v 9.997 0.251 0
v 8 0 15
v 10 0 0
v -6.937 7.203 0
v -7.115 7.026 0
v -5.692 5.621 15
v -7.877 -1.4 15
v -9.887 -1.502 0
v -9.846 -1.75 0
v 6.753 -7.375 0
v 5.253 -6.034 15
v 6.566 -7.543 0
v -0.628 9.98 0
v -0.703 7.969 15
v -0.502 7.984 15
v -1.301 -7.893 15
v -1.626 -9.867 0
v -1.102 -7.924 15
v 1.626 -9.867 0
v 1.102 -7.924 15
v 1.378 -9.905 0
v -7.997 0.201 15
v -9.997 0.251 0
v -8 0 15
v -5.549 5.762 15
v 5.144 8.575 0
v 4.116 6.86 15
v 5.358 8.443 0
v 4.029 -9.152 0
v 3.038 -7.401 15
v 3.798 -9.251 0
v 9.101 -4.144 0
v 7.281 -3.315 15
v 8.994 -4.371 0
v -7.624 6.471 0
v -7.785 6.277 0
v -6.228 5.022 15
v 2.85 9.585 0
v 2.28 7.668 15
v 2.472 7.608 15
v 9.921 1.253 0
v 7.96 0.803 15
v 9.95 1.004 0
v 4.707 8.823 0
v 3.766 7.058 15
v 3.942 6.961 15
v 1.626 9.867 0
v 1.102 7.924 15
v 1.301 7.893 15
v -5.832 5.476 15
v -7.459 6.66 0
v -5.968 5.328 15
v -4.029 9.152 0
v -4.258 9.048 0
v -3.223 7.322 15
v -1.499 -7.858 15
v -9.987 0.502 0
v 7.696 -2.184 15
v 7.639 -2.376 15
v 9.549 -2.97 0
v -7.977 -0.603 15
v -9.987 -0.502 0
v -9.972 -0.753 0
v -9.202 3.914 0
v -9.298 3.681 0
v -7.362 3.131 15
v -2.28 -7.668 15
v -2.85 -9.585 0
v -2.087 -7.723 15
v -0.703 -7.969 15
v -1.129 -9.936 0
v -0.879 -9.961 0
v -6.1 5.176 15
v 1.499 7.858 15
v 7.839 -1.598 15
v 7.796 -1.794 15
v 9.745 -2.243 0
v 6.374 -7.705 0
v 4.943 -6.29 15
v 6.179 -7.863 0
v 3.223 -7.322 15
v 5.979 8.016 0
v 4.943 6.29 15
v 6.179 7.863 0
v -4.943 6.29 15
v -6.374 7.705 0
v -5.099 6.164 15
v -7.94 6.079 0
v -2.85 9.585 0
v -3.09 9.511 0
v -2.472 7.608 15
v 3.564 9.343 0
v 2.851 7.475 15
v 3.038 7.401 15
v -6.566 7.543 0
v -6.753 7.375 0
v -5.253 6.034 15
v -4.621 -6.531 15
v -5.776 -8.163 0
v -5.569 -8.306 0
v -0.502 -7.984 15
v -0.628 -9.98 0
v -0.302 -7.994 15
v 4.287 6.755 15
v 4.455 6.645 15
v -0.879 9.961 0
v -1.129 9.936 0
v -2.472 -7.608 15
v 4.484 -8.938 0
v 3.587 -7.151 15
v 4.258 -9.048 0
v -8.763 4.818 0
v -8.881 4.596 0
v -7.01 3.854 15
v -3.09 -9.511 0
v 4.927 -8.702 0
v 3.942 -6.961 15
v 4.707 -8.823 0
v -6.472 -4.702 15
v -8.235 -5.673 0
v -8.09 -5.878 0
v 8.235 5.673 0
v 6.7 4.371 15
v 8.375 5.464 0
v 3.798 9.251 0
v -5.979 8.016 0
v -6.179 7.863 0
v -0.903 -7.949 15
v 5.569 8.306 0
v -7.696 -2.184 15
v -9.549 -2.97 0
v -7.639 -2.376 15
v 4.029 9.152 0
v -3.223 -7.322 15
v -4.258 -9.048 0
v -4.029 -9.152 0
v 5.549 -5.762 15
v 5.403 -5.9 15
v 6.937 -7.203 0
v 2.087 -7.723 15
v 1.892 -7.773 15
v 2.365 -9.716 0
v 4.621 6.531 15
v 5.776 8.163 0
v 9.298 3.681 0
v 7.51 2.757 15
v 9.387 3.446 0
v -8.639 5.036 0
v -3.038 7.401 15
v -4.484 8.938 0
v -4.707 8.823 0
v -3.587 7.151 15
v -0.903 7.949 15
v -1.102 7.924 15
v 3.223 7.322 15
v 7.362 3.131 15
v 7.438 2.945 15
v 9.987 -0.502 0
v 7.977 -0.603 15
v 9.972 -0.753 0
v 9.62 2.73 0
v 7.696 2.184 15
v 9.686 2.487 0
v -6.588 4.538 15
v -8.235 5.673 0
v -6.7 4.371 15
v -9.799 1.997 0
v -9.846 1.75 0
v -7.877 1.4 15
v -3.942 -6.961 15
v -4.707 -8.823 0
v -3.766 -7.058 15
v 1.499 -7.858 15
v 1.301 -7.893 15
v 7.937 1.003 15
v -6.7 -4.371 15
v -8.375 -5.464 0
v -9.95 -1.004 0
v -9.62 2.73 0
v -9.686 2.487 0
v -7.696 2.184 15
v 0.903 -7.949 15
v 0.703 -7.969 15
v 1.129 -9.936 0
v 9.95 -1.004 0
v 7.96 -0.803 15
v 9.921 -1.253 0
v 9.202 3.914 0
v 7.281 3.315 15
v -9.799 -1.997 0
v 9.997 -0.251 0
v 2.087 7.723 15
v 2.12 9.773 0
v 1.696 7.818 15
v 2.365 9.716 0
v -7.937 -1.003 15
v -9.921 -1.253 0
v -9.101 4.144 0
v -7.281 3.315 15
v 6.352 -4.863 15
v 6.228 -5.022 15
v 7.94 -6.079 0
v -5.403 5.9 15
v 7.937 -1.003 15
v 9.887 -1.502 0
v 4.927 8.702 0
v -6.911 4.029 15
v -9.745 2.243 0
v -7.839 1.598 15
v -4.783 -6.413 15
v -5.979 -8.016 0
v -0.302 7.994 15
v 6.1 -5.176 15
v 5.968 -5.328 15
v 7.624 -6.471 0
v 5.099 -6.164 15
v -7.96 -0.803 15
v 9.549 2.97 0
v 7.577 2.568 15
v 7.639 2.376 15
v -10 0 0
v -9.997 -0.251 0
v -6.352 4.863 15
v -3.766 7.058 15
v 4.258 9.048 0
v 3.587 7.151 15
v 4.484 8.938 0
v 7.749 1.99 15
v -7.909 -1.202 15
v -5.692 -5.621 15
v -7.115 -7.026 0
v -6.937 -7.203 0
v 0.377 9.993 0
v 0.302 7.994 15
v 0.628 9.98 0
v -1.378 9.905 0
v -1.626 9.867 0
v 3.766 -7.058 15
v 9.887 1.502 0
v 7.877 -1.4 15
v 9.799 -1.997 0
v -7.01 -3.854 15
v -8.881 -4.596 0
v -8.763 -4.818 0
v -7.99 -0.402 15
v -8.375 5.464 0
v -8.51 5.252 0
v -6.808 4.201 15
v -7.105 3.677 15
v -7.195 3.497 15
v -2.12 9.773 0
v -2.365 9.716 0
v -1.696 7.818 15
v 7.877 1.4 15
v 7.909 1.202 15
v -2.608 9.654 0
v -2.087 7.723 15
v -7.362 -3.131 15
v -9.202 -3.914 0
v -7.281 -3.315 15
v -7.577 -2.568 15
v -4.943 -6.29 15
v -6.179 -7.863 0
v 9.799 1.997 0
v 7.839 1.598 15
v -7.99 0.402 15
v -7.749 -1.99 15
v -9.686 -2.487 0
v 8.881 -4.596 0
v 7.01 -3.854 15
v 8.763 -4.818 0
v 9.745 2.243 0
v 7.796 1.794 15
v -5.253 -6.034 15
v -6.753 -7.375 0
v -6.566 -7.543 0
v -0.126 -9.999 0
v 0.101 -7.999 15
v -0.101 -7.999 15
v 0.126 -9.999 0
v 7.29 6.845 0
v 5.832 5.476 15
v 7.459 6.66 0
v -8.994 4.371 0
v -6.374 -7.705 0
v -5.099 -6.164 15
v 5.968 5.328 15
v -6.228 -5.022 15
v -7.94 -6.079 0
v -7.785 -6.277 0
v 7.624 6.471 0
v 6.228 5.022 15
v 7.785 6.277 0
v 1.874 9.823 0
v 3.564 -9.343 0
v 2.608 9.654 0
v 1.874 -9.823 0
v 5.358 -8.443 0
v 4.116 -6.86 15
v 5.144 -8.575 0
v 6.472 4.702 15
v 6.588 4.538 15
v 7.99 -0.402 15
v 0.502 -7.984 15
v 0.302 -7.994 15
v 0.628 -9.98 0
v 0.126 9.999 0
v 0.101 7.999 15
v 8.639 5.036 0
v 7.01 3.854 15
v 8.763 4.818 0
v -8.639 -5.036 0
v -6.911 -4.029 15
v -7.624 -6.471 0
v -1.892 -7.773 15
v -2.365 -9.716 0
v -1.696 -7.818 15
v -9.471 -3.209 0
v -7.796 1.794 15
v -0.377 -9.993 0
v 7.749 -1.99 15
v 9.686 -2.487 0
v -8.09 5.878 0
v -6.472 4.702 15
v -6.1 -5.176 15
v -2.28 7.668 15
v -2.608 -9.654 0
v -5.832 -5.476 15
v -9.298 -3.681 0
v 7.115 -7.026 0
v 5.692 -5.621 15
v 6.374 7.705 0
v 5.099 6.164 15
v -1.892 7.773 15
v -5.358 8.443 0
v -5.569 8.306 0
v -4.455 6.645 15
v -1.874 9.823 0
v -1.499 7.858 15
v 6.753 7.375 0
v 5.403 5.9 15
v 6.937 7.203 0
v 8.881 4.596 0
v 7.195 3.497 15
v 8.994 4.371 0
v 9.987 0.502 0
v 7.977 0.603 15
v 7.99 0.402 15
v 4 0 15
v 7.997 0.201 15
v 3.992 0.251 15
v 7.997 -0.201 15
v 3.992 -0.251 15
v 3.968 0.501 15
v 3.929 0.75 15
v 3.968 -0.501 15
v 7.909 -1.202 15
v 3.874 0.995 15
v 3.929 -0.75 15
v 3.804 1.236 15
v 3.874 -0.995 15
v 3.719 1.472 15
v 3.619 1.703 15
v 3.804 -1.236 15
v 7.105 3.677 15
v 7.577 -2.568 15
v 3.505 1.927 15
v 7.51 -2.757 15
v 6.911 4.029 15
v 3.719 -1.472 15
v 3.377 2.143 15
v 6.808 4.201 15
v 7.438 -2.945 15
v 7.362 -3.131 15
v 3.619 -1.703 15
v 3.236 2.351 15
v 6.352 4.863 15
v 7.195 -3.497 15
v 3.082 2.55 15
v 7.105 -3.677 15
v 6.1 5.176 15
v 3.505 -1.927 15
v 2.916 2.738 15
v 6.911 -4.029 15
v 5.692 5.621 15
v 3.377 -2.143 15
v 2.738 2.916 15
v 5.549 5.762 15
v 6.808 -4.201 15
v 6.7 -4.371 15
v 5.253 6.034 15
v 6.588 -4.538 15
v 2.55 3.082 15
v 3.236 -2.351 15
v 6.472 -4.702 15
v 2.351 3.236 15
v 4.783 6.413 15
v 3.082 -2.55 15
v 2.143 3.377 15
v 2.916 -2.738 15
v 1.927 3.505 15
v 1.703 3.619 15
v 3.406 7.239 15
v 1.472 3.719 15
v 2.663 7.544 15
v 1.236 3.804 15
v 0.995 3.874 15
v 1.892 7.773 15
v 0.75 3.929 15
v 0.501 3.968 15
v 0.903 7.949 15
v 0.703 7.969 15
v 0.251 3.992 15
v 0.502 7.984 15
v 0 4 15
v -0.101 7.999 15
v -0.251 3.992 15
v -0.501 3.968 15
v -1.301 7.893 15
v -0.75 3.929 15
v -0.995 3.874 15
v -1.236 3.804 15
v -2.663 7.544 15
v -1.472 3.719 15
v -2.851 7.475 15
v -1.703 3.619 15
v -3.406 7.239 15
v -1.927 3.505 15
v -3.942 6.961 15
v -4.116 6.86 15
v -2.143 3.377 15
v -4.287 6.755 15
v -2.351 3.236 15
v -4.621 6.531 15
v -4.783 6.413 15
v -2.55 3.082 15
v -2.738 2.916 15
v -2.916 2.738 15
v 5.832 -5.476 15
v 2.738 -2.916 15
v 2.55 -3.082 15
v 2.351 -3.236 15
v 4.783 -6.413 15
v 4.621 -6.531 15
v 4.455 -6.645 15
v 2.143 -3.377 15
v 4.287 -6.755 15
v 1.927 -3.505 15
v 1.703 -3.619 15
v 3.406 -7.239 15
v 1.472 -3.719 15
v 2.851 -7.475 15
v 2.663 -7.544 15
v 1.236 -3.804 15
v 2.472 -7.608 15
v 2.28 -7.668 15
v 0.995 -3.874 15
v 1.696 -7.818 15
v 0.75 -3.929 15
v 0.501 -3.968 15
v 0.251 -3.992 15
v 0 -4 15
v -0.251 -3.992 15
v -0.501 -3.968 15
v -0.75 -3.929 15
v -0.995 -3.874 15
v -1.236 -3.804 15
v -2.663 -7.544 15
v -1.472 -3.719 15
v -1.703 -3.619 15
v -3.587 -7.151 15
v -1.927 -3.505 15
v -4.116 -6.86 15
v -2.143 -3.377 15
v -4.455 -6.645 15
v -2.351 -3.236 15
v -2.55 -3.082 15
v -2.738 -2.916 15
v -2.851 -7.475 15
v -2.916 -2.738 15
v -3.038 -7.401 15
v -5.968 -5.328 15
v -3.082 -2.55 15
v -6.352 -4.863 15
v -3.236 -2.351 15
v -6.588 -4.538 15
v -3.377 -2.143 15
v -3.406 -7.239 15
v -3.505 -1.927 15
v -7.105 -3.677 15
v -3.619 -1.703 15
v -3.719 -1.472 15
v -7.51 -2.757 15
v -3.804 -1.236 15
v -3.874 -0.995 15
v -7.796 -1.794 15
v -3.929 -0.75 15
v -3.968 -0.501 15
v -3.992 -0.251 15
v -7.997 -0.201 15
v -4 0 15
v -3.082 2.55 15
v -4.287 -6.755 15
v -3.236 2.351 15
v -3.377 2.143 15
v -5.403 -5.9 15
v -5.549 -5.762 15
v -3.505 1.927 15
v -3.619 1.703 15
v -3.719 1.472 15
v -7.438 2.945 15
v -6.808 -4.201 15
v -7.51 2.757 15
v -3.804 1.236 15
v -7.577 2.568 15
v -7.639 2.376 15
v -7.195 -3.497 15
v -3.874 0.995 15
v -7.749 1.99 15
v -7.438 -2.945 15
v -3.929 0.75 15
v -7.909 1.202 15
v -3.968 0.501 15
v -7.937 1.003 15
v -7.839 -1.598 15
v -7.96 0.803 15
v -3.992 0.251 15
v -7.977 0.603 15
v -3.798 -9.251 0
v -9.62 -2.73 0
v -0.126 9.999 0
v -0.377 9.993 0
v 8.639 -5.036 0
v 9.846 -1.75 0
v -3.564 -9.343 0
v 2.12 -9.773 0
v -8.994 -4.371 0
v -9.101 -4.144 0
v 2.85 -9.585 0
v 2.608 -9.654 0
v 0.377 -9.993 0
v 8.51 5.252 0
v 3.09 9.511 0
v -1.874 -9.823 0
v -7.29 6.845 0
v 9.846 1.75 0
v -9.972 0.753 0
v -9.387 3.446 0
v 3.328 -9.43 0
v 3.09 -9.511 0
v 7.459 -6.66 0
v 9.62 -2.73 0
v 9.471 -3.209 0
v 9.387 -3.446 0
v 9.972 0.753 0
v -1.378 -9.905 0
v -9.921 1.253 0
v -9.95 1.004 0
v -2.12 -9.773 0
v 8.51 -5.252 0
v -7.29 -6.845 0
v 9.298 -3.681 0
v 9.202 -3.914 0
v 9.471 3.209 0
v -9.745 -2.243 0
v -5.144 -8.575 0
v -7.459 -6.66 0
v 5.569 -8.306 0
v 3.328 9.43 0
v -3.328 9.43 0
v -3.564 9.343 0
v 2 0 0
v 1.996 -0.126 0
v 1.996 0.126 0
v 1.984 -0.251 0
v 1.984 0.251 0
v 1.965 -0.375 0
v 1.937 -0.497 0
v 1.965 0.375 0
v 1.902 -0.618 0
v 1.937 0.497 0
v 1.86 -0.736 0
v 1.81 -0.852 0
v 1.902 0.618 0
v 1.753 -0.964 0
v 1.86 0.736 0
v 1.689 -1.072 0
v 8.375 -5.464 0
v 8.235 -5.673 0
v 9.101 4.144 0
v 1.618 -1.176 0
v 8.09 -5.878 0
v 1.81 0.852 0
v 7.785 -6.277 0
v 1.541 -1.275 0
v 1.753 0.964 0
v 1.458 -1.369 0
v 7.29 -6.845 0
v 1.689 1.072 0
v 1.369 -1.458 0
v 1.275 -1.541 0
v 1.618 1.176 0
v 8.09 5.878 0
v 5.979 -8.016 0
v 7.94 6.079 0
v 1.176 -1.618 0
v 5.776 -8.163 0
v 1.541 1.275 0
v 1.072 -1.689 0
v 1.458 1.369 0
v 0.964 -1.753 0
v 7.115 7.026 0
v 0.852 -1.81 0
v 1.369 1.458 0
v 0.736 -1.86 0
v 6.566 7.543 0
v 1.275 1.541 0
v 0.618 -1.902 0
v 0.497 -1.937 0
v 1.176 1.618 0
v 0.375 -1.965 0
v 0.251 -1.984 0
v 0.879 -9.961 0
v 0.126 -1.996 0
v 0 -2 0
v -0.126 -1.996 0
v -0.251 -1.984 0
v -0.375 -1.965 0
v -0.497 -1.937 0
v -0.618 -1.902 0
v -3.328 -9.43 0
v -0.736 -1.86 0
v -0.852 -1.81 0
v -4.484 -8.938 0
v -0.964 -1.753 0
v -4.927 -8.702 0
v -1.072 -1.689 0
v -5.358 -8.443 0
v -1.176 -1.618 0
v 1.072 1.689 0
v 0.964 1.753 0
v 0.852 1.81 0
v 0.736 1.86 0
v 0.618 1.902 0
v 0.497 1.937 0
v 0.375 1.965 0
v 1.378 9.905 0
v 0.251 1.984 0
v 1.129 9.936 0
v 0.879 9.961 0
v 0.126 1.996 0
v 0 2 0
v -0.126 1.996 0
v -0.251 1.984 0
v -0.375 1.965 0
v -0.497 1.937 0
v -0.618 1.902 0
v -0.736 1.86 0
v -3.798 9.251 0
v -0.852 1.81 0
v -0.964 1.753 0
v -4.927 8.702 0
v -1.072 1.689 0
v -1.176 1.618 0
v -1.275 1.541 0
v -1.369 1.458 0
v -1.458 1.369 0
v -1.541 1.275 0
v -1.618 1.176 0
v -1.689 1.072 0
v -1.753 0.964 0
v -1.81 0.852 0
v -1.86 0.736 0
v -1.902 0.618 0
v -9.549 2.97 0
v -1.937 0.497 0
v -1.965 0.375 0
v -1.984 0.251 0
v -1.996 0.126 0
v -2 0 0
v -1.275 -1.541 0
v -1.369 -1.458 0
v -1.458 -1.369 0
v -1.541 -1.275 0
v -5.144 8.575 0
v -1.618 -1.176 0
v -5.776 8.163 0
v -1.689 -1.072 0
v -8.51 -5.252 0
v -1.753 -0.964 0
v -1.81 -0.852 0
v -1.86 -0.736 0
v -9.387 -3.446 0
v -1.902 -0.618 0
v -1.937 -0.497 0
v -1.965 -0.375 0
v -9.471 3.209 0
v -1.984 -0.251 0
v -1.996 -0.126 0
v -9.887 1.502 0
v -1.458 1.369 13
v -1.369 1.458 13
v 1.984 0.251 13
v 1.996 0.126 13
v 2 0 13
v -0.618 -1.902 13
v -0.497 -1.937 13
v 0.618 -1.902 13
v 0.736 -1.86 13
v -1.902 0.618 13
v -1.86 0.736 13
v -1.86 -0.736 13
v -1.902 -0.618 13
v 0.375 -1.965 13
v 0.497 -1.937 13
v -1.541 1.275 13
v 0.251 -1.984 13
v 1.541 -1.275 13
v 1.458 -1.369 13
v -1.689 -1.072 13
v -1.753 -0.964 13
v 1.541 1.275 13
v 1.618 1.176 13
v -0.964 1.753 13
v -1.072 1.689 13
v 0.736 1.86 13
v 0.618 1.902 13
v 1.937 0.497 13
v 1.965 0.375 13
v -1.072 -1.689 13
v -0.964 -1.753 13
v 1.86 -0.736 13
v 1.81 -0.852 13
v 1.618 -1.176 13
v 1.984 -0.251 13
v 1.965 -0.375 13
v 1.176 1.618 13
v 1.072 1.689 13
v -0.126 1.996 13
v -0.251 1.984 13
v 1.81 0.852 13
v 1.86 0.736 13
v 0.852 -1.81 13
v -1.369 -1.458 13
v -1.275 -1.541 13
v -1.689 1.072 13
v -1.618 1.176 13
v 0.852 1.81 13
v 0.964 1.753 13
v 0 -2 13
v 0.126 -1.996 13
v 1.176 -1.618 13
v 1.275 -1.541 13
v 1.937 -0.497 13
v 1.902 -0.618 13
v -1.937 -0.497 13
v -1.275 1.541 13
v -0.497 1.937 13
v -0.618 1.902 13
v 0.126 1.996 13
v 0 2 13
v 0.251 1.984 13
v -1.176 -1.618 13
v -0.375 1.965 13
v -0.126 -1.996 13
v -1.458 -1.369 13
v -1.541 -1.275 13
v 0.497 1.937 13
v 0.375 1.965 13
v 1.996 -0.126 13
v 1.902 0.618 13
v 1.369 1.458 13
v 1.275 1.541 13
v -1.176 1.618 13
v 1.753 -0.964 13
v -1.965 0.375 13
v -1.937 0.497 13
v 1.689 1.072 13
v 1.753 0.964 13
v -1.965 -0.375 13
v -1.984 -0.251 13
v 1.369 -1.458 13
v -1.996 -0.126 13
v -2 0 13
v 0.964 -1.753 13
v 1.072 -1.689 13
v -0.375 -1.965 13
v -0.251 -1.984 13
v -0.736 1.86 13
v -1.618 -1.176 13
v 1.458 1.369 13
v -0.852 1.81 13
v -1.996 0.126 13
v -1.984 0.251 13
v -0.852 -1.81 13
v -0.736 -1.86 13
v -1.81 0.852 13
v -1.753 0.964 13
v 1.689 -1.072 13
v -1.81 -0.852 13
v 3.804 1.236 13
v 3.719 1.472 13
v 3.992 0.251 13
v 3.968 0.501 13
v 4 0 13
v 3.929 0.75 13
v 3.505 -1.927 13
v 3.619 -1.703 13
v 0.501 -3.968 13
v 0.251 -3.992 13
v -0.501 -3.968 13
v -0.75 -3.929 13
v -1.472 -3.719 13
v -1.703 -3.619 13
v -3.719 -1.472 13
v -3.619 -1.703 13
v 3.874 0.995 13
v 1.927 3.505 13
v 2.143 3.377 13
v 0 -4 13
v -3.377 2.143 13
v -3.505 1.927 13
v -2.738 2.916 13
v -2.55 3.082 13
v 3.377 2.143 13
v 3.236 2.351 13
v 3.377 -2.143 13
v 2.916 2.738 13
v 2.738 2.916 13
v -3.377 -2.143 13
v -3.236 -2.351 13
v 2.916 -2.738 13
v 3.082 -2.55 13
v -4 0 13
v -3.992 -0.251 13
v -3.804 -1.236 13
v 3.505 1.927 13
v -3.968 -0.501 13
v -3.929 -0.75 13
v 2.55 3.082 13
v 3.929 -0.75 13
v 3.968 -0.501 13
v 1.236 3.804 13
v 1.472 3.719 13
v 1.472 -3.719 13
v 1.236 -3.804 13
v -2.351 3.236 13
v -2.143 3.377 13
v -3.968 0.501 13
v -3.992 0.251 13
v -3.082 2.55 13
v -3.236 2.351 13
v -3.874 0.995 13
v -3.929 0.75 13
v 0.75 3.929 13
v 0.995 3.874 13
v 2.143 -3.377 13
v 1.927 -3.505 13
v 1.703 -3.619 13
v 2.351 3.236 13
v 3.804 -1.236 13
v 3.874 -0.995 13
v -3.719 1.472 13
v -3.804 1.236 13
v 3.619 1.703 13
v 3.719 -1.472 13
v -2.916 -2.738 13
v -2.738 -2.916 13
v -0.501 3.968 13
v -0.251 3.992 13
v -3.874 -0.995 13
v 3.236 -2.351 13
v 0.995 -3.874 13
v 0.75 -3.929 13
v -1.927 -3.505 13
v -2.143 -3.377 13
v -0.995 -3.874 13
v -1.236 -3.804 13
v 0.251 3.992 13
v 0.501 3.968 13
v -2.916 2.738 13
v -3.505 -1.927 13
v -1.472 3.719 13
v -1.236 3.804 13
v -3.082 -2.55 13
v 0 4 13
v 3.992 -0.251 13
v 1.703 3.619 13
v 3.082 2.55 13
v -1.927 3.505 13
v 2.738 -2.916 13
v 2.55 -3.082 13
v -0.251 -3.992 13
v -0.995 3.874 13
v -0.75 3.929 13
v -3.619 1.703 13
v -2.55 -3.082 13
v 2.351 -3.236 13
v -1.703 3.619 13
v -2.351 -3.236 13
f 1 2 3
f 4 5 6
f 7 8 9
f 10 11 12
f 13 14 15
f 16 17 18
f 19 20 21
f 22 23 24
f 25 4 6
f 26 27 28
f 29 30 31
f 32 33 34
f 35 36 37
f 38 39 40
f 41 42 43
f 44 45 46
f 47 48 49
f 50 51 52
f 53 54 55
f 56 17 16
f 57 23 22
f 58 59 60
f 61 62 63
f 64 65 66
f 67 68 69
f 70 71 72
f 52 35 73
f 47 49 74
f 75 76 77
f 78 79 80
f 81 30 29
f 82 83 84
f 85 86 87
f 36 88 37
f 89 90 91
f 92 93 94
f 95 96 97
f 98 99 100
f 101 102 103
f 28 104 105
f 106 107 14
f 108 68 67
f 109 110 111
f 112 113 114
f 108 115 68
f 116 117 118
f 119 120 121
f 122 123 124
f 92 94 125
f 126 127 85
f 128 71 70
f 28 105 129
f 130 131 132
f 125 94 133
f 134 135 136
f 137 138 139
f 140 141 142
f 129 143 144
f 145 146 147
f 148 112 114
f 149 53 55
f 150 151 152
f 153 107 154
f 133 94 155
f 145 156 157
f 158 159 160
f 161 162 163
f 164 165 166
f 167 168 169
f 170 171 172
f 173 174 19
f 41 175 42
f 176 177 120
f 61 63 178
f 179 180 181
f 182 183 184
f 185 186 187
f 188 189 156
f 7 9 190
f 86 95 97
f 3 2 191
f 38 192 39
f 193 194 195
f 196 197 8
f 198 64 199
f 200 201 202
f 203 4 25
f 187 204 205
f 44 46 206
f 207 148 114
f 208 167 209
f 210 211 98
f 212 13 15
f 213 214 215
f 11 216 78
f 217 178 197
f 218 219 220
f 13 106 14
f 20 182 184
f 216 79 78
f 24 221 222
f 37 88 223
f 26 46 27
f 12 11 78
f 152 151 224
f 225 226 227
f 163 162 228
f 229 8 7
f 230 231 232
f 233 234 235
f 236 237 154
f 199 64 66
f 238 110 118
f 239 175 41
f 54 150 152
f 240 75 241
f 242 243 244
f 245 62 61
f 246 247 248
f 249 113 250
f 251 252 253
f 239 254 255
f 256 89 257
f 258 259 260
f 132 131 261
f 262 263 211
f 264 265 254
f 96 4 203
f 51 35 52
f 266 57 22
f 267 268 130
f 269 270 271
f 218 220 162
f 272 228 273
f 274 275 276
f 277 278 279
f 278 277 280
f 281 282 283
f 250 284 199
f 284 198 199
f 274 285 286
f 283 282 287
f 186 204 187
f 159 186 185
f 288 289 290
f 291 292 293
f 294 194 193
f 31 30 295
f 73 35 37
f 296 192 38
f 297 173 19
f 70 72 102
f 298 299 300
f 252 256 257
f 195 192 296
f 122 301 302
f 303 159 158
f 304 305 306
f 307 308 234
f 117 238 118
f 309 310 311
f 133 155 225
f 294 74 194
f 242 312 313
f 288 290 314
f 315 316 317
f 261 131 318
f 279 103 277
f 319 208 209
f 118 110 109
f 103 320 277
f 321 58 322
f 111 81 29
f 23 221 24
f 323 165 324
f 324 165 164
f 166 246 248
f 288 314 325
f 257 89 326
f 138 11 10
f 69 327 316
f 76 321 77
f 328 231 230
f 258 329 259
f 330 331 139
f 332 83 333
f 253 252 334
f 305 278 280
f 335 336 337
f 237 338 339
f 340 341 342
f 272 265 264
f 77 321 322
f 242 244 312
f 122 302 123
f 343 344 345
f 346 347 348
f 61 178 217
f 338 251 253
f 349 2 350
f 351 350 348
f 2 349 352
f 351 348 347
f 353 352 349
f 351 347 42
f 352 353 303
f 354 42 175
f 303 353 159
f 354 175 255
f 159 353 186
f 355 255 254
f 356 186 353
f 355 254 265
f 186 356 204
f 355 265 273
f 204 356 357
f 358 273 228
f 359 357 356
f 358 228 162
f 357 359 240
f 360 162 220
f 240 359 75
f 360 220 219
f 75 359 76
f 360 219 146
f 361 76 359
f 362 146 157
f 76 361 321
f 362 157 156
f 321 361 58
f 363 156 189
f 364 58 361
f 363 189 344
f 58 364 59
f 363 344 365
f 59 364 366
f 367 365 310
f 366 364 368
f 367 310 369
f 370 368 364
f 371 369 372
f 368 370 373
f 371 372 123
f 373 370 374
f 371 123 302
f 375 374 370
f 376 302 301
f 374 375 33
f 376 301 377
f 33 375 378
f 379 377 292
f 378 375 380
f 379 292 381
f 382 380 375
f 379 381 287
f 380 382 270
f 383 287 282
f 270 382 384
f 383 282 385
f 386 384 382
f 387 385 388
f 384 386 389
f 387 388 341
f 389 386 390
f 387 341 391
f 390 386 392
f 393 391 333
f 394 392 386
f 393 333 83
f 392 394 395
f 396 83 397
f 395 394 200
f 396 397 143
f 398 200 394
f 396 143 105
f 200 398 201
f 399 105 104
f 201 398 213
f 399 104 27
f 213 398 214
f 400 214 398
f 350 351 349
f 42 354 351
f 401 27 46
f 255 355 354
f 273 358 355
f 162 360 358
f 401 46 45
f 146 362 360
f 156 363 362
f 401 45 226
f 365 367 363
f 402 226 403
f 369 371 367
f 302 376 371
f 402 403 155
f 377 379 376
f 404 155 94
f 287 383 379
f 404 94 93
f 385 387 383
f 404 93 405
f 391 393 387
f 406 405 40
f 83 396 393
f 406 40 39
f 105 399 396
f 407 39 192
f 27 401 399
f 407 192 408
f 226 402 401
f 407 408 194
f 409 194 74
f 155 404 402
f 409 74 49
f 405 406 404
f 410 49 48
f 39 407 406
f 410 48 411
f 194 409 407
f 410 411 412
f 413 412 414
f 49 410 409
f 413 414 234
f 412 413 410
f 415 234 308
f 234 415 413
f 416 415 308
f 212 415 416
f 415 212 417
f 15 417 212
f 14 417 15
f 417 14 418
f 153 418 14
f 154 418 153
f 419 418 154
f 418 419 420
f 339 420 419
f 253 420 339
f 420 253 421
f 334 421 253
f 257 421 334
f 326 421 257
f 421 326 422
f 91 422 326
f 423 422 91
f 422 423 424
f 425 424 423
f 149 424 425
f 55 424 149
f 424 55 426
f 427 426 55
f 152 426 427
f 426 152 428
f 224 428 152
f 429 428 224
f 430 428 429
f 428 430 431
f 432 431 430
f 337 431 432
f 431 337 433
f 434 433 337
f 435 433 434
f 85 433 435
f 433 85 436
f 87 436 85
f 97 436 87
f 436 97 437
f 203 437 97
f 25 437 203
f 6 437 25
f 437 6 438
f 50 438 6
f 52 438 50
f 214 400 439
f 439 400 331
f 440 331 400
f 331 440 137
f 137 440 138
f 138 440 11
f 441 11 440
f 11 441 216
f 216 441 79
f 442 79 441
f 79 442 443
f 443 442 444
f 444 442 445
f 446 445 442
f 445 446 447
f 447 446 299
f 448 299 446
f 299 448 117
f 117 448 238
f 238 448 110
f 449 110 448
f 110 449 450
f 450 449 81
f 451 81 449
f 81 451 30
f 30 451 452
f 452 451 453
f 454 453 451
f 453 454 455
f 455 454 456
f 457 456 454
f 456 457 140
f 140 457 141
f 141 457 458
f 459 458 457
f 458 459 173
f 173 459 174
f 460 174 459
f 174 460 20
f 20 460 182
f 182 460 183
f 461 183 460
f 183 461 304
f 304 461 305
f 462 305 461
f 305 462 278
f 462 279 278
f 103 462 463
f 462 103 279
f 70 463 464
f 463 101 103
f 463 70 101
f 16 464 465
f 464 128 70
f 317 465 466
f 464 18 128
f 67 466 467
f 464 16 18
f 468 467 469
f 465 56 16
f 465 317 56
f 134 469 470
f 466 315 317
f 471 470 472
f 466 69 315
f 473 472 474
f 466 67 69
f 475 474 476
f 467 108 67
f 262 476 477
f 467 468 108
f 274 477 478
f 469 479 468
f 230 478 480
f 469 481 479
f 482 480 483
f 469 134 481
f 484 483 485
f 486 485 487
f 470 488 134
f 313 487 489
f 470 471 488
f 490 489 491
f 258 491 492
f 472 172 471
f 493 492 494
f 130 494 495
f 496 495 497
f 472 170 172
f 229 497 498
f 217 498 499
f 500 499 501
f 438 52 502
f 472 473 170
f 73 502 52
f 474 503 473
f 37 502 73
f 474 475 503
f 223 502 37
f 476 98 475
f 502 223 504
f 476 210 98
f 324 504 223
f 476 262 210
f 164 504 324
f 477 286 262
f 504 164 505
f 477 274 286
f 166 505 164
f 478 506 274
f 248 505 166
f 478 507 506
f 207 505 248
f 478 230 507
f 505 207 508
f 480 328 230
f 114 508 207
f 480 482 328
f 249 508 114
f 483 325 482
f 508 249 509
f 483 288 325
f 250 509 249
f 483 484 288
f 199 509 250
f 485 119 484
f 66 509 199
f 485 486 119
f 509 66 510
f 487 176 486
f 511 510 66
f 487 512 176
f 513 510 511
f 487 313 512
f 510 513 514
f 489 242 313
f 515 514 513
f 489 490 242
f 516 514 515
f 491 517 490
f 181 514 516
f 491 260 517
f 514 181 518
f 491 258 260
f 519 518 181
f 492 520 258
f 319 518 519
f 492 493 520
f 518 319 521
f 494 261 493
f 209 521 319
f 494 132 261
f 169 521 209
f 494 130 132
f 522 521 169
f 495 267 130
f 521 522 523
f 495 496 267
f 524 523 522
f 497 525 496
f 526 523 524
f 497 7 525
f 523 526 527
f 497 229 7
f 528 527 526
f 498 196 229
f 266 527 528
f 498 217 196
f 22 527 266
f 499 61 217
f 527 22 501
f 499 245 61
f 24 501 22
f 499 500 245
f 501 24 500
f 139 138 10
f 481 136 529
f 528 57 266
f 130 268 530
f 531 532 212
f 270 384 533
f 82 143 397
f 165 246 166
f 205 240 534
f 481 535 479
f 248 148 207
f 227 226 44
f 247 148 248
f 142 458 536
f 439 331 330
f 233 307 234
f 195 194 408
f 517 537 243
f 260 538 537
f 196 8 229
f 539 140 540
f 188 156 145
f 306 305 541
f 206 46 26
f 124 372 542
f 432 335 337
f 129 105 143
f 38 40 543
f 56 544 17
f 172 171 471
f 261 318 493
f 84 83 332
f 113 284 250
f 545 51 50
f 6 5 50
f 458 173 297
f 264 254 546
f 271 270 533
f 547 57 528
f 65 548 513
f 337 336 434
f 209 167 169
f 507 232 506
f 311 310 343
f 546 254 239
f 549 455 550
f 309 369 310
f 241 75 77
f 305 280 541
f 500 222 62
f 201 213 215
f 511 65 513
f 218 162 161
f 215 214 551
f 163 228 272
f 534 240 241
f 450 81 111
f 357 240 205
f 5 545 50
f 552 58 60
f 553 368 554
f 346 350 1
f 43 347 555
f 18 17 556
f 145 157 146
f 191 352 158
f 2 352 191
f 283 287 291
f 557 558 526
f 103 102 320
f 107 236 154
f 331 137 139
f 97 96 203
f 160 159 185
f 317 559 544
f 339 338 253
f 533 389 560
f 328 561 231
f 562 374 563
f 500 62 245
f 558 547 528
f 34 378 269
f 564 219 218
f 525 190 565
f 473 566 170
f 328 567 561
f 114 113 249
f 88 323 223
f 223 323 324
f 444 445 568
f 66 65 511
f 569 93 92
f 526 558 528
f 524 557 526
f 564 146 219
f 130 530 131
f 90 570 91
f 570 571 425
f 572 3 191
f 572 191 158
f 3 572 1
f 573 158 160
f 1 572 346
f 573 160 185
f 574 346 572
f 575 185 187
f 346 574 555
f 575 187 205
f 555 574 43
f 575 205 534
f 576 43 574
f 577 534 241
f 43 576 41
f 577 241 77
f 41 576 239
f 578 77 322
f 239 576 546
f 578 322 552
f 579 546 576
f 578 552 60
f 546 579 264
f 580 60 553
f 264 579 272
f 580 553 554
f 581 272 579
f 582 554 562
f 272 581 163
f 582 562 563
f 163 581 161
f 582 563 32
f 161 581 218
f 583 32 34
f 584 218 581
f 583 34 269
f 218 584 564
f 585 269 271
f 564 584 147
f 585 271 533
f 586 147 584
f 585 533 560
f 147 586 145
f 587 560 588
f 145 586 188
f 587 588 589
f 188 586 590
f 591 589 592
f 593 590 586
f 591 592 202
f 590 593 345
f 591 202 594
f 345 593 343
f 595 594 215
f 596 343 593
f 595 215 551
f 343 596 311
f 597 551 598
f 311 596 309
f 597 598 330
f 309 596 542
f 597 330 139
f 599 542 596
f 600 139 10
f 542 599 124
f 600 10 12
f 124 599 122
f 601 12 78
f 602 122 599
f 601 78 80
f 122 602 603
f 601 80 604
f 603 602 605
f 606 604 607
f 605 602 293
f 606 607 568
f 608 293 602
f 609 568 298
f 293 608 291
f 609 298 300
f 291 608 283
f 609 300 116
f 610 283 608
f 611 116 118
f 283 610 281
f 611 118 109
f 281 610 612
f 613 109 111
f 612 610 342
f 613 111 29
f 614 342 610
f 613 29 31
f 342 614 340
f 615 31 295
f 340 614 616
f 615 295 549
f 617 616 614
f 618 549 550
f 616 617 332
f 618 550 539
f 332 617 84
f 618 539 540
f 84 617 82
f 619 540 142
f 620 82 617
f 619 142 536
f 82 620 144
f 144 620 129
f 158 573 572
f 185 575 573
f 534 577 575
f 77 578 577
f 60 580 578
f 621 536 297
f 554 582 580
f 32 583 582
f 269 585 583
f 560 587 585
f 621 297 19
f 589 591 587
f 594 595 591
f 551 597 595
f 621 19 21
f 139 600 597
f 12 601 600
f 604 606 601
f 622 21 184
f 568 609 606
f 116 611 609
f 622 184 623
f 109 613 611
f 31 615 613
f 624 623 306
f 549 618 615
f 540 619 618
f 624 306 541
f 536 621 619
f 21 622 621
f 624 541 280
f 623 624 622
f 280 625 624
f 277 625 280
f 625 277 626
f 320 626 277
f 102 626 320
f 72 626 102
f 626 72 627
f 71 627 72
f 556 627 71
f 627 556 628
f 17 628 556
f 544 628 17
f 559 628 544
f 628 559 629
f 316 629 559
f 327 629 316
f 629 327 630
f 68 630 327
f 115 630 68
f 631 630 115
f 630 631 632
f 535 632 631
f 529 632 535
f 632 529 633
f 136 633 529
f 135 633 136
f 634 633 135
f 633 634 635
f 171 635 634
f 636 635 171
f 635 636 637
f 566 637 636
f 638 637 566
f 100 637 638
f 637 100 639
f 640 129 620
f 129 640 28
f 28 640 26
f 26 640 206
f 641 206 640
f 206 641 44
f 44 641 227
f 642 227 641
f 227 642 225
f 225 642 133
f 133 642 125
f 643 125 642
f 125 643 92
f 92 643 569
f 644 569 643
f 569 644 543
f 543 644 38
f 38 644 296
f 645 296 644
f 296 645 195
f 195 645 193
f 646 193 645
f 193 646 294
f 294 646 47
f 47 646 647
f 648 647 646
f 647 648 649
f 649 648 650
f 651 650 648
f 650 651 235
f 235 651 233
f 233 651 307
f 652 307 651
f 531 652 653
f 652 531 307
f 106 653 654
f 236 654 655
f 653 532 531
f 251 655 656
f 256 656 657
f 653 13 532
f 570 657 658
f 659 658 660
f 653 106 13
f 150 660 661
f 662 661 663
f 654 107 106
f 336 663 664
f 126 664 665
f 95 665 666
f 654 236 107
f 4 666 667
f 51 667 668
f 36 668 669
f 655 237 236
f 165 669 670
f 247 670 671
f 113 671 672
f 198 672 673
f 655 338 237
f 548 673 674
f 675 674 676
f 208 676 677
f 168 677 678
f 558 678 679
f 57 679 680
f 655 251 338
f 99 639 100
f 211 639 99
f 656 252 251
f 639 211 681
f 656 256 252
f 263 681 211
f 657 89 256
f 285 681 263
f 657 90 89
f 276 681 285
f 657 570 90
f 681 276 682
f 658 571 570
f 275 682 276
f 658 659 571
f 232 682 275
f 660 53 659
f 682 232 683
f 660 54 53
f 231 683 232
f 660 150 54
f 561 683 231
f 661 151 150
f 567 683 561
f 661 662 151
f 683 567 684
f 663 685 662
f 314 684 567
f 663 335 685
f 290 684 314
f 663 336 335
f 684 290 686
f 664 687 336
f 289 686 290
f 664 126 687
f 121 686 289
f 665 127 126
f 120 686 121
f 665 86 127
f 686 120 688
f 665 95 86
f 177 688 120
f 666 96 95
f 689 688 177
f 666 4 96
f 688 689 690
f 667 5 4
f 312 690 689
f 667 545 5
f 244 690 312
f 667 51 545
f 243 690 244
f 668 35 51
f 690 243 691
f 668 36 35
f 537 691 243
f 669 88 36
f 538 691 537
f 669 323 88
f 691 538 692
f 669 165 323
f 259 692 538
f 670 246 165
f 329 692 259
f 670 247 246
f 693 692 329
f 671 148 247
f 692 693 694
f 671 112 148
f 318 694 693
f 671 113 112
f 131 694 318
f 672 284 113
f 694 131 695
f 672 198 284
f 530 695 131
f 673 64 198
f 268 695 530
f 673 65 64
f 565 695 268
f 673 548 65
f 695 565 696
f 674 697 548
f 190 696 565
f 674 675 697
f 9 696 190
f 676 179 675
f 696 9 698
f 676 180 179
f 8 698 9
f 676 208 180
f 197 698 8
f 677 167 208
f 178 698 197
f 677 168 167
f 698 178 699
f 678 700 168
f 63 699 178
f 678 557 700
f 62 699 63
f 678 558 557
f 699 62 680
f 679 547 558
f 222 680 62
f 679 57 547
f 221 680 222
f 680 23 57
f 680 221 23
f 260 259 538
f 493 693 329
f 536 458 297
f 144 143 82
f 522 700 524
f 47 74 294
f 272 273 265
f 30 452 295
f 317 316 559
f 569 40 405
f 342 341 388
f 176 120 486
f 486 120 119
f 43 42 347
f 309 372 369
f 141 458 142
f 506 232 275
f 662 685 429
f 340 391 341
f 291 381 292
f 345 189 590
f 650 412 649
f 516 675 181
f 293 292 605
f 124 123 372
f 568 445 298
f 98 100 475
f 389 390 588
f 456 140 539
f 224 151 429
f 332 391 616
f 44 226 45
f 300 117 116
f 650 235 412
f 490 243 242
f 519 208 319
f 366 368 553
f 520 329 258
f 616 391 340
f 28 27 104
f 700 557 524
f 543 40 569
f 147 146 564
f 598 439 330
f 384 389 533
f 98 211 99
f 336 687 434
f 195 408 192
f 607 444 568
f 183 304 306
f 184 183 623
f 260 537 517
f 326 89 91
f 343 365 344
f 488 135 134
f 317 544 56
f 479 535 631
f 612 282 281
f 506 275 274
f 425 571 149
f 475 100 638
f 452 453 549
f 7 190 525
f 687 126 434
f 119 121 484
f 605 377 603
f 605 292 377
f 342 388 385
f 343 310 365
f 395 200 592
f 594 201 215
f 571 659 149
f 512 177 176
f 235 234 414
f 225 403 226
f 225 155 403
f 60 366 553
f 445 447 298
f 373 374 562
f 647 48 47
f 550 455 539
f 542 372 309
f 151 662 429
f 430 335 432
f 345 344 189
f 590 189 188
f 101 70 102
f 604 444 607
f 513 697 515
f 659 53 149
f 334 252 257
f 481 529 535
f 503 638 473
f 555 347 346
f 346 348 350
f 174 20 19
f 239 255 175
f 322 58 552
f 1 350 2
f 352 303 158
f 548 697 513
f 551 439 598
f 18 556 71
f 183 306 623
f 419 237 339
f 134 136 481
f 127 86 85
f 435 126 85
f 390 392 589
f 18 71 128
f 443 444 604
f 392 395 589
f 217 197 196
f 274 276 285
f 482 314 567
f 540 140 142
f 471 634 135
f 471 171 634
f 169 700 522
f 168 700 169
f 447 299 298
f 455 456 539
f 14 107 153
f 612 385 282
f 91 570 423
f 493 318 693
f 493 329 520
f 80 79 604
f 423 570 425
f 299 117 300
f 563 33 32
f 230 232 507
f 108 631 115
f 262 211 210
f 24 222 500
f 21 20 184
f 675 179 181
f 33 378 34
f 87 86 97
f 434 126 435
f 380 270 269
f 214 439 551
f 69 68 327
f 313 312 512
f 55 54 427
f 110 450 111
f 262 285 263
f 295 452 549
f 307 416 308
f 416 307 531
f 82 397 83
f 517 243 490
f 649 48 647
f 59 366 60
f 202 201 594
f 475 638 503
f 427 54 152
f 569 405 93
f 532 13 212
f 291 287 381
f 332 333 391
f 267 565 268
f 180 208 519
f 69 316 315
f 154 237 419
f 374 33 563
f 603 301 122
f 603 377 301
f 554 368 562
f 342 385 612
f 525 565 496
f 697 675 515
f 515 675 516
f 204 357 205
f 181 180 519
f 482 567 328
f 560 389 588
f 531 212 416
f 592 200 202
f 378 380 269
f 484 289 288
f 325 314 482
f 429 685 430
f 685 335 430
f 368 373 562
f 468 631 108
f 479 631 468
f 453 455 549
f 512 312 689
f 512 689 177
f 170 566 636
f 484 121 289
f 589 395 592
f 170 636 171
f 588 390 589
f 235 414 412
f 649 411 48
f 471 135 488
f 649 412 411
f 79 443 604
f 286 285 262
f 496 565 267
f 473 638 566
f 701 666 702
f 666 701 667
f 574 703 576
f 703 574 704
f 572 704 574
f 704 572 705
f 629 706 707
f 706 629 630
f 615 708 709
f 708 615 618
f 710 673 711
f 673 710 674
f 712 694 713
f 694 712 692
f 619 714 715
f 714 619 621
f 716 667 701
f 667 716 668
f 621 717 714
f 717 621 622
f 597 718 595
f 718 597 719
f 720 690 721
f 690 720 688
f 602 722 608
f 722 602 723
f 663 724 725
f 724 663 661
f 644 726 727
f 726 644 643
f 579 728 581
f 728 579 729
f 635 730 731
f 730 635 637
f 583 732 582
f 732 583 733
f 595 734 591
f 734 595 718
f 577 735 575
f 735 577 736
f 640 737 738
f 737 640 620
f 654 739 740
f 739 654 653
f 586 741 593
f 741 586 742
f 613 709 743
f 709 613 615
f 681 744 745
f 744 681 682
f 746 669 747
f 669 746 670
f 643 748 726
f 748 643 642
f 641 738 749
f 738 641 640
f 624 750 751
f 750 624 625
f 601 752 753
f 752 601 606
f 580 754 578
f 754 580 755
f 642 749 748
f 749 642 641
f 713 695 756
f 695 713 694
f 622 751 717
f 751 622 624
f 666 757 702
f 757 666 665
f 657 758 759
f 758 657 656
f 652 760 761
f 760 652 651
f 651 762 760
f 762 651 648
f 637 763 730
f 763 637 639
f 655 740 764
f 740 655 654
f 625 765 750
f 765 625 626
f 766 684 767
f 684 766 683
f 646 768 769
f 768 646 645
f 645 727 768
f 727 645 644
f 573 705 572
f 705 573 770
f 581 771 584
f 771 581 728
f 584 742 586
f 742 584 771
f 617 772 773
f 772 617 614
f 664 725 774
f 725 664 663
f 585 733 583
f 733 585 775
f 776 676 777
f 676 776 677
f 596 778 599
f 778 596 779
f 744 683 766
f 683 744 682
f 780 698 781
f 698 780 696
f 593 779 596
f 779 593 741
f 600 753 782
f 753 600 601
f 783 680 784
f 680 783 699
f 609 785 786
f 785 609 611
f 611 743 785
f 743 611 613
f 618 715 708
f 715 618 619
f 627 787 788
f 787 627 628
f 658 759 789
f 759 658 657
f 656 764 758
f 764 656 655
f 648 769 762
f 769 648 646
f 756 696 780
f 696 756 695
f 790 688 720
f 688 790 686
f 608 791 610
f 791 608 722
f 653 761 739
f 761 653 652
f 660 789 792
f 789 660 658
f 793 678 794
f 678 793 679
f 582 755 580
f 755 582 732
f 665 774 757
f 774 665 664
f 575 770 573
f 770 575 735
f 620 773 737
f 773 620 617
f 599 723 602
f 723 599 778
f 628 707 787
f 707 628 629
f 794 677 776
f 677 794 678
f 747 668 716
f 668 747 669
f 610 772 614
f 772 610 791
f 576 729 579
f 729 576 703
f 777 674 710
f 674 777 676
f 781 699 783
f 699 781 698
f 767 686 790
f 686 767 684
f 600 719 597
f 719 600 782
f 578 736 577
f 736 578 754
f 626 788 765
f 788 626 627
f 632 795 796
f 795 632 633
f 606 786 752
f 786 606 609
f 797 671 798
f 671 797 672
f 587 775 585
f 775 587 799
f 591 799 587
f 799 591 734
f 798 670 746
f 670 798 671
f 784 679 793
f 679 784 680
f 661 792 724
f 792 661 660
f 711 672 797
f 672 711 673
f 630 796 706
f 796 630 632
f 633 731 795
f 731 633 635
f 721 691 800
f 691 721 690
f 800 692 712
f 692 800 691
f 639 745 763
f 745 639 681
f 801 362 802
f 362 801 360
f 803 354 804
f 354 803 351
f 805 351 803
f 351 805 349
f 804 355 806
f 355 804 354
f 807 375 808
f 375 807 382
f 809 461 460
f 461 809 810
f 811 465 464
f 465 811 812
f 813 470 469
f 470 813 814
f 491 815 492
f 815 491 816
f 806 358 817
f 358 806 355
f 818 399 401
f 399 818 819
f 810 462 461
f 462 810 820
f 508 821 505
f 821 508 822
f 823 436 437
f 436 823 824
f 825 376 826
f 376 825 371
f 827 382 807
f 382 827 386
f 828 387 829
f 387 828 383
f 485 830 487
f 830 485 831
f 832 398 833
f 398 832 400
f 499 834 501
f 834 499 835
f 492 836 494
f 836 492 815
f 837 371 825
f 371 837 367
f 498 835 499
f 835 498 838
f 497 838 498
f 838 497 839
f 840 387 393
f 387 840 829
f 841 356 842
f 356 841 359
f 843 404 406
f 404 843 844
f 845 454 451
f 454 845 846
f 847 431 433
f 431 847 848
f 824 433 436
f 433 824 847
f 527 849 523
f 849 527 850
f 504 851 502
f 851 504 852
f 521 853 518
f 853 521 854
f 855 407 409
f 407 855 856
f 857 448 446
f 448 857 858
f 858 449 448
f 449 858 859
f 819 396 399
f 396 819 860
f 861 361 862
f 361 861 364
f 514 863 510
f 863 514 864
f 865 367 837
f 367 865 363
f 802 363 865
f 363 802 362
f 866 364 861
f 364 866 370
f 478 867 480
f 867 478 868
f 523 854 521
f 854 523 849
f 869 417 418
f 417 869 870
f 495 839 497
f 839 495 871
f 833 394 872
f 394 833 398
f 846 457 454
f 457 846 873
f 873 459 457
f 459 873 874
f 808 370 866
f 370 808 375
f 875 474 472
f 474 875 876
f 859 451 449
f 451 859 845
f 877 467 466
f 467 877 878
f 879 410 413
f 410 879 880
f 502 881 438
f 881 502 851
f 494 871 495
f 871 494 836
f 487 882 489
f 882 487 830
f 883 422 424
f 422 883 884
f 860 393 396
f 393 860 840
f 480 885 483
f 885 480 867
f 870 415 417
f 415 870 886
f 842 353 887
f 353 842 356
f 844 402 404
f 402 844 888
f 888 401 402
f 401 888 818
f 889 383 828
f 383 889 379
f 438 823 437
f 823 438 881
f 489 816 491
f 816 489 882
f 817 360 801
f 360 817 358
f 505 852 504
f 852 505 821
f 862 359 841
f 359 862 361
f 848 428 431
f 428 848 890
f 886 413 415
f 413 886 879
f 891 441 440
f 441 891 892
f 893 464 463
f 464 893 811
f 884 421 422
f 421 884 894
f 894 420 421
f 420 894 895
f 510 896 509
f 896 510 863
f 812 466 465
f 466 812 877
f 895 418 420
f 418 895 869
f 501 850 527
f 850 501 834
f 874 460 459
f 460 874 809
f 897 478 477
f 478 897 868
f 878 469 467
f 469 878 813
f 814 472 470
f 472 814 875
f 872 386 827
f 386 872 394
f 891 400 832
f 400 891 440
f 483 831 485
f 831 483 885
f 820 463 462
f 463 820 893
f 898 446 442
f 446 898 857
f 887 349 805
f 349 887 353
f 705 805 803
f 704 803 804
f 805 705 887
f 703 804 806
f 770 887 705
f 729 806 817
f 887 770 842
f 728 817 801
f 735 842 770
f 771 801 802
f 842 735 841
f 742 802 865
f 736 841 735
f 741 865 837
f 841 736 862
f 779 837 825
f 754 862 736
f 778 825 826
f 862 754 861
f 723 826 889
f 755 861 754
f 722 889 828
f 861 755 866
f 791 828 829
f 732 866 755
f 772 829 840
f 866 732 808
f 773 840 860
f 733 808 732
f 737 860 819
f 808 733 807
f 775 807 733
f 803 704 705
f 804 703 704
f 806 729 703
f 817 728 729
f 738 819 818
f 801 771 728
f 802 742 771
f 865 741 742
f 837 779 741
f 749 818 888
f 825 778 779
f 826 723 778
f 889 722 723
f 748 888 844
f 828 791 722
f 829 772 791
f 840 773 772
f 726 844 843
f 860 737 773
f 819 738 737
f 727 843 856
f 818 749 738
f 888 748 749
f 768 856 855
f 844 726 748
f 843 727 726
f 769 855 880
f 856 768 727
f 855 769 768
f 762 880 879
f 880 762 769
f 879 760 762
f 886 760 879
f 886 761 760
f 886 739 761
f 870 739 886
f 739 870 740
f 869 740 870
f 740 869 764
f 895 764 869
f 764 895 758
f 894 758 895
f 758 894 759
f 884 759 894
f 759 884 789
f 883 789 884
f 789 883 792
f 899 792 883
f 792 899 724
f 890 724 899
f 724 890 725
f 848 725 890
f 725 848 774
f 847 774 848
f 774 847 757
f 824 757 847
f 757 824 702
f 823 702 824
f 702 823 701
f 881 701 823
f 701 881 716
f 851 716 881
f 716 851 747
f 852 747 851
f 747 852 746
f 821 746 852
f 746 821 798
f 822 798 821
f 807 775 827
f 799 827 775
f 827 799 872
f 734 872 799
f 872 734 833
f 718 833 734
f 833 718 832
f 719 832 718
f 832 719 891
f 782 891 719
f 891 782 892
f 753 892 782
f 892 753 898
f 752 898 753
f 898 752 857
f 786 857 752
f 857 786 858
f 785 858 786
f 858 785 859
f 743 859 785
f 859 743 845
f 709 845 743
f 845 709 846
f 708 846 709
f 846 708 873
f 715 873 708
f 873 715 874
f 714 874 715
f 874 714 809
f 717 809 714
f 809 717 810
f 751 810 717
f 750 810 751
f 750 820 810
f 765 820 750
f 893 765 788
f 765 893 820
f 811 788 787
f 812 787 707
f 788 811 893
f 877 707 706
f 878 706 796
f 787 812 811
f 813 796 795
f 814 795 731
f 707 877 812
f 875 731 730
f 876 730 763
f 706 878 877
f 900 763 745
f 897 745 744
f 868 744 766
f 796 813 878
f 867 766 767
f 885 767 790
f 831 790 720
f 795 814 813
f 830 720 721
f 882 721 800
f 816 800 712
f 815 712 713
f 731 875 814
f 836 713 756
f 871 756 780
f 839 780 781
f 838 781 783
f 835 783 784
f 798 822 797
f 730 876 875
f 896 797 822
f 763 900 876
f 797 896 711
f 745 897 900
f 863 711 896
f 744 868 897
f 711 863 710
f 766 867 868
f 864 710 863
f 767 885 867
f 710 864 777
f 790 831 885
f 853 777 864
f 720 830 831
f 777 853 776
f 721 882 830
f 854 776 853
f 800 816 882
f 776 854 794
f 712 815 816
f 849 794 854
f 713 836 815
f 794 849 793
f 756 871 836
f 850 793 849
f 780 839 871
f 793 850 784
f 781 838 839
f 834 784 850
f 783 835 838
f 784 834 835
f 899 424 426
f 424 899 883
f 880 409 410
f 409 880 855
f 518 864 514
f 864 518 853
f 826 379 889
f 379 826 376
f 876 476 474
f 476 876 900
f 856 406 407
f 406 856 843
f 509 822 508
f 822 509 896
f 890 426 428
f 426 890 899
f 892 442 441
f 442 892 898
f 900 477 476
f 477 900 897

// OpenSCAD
//Heigth of the Foot
FootHeigth = 15; //[5:50]

//Top foot size
TopWith = 10; //[5:30]

//Bottom foot size
BottomWith = 8; //[5:30]

//Hole diameter
HoleDiameter = 2; //[0.5:5]

//Size of the screw / nail
HeadHigth = 2; //[1:10]

//Size of the screw / nail Head
HeadWith = 4; //[2:10]


module FurnitureFoot()
{
	difference()
	{
		cylinder(r1=TopWith, r2=BottomWith, h=FootHeigth, $fn=250);
		translate([0,0,-1])cylinder(r=HoleDiameter, h=(FootHeigth+2),$fn=100);
		translate([0,0,FootHeigth-HeadHigth])cylinder(r=HeadWith, h=HeadHigth+1,$fn=100);
	}
}

FurnitureFoot();
